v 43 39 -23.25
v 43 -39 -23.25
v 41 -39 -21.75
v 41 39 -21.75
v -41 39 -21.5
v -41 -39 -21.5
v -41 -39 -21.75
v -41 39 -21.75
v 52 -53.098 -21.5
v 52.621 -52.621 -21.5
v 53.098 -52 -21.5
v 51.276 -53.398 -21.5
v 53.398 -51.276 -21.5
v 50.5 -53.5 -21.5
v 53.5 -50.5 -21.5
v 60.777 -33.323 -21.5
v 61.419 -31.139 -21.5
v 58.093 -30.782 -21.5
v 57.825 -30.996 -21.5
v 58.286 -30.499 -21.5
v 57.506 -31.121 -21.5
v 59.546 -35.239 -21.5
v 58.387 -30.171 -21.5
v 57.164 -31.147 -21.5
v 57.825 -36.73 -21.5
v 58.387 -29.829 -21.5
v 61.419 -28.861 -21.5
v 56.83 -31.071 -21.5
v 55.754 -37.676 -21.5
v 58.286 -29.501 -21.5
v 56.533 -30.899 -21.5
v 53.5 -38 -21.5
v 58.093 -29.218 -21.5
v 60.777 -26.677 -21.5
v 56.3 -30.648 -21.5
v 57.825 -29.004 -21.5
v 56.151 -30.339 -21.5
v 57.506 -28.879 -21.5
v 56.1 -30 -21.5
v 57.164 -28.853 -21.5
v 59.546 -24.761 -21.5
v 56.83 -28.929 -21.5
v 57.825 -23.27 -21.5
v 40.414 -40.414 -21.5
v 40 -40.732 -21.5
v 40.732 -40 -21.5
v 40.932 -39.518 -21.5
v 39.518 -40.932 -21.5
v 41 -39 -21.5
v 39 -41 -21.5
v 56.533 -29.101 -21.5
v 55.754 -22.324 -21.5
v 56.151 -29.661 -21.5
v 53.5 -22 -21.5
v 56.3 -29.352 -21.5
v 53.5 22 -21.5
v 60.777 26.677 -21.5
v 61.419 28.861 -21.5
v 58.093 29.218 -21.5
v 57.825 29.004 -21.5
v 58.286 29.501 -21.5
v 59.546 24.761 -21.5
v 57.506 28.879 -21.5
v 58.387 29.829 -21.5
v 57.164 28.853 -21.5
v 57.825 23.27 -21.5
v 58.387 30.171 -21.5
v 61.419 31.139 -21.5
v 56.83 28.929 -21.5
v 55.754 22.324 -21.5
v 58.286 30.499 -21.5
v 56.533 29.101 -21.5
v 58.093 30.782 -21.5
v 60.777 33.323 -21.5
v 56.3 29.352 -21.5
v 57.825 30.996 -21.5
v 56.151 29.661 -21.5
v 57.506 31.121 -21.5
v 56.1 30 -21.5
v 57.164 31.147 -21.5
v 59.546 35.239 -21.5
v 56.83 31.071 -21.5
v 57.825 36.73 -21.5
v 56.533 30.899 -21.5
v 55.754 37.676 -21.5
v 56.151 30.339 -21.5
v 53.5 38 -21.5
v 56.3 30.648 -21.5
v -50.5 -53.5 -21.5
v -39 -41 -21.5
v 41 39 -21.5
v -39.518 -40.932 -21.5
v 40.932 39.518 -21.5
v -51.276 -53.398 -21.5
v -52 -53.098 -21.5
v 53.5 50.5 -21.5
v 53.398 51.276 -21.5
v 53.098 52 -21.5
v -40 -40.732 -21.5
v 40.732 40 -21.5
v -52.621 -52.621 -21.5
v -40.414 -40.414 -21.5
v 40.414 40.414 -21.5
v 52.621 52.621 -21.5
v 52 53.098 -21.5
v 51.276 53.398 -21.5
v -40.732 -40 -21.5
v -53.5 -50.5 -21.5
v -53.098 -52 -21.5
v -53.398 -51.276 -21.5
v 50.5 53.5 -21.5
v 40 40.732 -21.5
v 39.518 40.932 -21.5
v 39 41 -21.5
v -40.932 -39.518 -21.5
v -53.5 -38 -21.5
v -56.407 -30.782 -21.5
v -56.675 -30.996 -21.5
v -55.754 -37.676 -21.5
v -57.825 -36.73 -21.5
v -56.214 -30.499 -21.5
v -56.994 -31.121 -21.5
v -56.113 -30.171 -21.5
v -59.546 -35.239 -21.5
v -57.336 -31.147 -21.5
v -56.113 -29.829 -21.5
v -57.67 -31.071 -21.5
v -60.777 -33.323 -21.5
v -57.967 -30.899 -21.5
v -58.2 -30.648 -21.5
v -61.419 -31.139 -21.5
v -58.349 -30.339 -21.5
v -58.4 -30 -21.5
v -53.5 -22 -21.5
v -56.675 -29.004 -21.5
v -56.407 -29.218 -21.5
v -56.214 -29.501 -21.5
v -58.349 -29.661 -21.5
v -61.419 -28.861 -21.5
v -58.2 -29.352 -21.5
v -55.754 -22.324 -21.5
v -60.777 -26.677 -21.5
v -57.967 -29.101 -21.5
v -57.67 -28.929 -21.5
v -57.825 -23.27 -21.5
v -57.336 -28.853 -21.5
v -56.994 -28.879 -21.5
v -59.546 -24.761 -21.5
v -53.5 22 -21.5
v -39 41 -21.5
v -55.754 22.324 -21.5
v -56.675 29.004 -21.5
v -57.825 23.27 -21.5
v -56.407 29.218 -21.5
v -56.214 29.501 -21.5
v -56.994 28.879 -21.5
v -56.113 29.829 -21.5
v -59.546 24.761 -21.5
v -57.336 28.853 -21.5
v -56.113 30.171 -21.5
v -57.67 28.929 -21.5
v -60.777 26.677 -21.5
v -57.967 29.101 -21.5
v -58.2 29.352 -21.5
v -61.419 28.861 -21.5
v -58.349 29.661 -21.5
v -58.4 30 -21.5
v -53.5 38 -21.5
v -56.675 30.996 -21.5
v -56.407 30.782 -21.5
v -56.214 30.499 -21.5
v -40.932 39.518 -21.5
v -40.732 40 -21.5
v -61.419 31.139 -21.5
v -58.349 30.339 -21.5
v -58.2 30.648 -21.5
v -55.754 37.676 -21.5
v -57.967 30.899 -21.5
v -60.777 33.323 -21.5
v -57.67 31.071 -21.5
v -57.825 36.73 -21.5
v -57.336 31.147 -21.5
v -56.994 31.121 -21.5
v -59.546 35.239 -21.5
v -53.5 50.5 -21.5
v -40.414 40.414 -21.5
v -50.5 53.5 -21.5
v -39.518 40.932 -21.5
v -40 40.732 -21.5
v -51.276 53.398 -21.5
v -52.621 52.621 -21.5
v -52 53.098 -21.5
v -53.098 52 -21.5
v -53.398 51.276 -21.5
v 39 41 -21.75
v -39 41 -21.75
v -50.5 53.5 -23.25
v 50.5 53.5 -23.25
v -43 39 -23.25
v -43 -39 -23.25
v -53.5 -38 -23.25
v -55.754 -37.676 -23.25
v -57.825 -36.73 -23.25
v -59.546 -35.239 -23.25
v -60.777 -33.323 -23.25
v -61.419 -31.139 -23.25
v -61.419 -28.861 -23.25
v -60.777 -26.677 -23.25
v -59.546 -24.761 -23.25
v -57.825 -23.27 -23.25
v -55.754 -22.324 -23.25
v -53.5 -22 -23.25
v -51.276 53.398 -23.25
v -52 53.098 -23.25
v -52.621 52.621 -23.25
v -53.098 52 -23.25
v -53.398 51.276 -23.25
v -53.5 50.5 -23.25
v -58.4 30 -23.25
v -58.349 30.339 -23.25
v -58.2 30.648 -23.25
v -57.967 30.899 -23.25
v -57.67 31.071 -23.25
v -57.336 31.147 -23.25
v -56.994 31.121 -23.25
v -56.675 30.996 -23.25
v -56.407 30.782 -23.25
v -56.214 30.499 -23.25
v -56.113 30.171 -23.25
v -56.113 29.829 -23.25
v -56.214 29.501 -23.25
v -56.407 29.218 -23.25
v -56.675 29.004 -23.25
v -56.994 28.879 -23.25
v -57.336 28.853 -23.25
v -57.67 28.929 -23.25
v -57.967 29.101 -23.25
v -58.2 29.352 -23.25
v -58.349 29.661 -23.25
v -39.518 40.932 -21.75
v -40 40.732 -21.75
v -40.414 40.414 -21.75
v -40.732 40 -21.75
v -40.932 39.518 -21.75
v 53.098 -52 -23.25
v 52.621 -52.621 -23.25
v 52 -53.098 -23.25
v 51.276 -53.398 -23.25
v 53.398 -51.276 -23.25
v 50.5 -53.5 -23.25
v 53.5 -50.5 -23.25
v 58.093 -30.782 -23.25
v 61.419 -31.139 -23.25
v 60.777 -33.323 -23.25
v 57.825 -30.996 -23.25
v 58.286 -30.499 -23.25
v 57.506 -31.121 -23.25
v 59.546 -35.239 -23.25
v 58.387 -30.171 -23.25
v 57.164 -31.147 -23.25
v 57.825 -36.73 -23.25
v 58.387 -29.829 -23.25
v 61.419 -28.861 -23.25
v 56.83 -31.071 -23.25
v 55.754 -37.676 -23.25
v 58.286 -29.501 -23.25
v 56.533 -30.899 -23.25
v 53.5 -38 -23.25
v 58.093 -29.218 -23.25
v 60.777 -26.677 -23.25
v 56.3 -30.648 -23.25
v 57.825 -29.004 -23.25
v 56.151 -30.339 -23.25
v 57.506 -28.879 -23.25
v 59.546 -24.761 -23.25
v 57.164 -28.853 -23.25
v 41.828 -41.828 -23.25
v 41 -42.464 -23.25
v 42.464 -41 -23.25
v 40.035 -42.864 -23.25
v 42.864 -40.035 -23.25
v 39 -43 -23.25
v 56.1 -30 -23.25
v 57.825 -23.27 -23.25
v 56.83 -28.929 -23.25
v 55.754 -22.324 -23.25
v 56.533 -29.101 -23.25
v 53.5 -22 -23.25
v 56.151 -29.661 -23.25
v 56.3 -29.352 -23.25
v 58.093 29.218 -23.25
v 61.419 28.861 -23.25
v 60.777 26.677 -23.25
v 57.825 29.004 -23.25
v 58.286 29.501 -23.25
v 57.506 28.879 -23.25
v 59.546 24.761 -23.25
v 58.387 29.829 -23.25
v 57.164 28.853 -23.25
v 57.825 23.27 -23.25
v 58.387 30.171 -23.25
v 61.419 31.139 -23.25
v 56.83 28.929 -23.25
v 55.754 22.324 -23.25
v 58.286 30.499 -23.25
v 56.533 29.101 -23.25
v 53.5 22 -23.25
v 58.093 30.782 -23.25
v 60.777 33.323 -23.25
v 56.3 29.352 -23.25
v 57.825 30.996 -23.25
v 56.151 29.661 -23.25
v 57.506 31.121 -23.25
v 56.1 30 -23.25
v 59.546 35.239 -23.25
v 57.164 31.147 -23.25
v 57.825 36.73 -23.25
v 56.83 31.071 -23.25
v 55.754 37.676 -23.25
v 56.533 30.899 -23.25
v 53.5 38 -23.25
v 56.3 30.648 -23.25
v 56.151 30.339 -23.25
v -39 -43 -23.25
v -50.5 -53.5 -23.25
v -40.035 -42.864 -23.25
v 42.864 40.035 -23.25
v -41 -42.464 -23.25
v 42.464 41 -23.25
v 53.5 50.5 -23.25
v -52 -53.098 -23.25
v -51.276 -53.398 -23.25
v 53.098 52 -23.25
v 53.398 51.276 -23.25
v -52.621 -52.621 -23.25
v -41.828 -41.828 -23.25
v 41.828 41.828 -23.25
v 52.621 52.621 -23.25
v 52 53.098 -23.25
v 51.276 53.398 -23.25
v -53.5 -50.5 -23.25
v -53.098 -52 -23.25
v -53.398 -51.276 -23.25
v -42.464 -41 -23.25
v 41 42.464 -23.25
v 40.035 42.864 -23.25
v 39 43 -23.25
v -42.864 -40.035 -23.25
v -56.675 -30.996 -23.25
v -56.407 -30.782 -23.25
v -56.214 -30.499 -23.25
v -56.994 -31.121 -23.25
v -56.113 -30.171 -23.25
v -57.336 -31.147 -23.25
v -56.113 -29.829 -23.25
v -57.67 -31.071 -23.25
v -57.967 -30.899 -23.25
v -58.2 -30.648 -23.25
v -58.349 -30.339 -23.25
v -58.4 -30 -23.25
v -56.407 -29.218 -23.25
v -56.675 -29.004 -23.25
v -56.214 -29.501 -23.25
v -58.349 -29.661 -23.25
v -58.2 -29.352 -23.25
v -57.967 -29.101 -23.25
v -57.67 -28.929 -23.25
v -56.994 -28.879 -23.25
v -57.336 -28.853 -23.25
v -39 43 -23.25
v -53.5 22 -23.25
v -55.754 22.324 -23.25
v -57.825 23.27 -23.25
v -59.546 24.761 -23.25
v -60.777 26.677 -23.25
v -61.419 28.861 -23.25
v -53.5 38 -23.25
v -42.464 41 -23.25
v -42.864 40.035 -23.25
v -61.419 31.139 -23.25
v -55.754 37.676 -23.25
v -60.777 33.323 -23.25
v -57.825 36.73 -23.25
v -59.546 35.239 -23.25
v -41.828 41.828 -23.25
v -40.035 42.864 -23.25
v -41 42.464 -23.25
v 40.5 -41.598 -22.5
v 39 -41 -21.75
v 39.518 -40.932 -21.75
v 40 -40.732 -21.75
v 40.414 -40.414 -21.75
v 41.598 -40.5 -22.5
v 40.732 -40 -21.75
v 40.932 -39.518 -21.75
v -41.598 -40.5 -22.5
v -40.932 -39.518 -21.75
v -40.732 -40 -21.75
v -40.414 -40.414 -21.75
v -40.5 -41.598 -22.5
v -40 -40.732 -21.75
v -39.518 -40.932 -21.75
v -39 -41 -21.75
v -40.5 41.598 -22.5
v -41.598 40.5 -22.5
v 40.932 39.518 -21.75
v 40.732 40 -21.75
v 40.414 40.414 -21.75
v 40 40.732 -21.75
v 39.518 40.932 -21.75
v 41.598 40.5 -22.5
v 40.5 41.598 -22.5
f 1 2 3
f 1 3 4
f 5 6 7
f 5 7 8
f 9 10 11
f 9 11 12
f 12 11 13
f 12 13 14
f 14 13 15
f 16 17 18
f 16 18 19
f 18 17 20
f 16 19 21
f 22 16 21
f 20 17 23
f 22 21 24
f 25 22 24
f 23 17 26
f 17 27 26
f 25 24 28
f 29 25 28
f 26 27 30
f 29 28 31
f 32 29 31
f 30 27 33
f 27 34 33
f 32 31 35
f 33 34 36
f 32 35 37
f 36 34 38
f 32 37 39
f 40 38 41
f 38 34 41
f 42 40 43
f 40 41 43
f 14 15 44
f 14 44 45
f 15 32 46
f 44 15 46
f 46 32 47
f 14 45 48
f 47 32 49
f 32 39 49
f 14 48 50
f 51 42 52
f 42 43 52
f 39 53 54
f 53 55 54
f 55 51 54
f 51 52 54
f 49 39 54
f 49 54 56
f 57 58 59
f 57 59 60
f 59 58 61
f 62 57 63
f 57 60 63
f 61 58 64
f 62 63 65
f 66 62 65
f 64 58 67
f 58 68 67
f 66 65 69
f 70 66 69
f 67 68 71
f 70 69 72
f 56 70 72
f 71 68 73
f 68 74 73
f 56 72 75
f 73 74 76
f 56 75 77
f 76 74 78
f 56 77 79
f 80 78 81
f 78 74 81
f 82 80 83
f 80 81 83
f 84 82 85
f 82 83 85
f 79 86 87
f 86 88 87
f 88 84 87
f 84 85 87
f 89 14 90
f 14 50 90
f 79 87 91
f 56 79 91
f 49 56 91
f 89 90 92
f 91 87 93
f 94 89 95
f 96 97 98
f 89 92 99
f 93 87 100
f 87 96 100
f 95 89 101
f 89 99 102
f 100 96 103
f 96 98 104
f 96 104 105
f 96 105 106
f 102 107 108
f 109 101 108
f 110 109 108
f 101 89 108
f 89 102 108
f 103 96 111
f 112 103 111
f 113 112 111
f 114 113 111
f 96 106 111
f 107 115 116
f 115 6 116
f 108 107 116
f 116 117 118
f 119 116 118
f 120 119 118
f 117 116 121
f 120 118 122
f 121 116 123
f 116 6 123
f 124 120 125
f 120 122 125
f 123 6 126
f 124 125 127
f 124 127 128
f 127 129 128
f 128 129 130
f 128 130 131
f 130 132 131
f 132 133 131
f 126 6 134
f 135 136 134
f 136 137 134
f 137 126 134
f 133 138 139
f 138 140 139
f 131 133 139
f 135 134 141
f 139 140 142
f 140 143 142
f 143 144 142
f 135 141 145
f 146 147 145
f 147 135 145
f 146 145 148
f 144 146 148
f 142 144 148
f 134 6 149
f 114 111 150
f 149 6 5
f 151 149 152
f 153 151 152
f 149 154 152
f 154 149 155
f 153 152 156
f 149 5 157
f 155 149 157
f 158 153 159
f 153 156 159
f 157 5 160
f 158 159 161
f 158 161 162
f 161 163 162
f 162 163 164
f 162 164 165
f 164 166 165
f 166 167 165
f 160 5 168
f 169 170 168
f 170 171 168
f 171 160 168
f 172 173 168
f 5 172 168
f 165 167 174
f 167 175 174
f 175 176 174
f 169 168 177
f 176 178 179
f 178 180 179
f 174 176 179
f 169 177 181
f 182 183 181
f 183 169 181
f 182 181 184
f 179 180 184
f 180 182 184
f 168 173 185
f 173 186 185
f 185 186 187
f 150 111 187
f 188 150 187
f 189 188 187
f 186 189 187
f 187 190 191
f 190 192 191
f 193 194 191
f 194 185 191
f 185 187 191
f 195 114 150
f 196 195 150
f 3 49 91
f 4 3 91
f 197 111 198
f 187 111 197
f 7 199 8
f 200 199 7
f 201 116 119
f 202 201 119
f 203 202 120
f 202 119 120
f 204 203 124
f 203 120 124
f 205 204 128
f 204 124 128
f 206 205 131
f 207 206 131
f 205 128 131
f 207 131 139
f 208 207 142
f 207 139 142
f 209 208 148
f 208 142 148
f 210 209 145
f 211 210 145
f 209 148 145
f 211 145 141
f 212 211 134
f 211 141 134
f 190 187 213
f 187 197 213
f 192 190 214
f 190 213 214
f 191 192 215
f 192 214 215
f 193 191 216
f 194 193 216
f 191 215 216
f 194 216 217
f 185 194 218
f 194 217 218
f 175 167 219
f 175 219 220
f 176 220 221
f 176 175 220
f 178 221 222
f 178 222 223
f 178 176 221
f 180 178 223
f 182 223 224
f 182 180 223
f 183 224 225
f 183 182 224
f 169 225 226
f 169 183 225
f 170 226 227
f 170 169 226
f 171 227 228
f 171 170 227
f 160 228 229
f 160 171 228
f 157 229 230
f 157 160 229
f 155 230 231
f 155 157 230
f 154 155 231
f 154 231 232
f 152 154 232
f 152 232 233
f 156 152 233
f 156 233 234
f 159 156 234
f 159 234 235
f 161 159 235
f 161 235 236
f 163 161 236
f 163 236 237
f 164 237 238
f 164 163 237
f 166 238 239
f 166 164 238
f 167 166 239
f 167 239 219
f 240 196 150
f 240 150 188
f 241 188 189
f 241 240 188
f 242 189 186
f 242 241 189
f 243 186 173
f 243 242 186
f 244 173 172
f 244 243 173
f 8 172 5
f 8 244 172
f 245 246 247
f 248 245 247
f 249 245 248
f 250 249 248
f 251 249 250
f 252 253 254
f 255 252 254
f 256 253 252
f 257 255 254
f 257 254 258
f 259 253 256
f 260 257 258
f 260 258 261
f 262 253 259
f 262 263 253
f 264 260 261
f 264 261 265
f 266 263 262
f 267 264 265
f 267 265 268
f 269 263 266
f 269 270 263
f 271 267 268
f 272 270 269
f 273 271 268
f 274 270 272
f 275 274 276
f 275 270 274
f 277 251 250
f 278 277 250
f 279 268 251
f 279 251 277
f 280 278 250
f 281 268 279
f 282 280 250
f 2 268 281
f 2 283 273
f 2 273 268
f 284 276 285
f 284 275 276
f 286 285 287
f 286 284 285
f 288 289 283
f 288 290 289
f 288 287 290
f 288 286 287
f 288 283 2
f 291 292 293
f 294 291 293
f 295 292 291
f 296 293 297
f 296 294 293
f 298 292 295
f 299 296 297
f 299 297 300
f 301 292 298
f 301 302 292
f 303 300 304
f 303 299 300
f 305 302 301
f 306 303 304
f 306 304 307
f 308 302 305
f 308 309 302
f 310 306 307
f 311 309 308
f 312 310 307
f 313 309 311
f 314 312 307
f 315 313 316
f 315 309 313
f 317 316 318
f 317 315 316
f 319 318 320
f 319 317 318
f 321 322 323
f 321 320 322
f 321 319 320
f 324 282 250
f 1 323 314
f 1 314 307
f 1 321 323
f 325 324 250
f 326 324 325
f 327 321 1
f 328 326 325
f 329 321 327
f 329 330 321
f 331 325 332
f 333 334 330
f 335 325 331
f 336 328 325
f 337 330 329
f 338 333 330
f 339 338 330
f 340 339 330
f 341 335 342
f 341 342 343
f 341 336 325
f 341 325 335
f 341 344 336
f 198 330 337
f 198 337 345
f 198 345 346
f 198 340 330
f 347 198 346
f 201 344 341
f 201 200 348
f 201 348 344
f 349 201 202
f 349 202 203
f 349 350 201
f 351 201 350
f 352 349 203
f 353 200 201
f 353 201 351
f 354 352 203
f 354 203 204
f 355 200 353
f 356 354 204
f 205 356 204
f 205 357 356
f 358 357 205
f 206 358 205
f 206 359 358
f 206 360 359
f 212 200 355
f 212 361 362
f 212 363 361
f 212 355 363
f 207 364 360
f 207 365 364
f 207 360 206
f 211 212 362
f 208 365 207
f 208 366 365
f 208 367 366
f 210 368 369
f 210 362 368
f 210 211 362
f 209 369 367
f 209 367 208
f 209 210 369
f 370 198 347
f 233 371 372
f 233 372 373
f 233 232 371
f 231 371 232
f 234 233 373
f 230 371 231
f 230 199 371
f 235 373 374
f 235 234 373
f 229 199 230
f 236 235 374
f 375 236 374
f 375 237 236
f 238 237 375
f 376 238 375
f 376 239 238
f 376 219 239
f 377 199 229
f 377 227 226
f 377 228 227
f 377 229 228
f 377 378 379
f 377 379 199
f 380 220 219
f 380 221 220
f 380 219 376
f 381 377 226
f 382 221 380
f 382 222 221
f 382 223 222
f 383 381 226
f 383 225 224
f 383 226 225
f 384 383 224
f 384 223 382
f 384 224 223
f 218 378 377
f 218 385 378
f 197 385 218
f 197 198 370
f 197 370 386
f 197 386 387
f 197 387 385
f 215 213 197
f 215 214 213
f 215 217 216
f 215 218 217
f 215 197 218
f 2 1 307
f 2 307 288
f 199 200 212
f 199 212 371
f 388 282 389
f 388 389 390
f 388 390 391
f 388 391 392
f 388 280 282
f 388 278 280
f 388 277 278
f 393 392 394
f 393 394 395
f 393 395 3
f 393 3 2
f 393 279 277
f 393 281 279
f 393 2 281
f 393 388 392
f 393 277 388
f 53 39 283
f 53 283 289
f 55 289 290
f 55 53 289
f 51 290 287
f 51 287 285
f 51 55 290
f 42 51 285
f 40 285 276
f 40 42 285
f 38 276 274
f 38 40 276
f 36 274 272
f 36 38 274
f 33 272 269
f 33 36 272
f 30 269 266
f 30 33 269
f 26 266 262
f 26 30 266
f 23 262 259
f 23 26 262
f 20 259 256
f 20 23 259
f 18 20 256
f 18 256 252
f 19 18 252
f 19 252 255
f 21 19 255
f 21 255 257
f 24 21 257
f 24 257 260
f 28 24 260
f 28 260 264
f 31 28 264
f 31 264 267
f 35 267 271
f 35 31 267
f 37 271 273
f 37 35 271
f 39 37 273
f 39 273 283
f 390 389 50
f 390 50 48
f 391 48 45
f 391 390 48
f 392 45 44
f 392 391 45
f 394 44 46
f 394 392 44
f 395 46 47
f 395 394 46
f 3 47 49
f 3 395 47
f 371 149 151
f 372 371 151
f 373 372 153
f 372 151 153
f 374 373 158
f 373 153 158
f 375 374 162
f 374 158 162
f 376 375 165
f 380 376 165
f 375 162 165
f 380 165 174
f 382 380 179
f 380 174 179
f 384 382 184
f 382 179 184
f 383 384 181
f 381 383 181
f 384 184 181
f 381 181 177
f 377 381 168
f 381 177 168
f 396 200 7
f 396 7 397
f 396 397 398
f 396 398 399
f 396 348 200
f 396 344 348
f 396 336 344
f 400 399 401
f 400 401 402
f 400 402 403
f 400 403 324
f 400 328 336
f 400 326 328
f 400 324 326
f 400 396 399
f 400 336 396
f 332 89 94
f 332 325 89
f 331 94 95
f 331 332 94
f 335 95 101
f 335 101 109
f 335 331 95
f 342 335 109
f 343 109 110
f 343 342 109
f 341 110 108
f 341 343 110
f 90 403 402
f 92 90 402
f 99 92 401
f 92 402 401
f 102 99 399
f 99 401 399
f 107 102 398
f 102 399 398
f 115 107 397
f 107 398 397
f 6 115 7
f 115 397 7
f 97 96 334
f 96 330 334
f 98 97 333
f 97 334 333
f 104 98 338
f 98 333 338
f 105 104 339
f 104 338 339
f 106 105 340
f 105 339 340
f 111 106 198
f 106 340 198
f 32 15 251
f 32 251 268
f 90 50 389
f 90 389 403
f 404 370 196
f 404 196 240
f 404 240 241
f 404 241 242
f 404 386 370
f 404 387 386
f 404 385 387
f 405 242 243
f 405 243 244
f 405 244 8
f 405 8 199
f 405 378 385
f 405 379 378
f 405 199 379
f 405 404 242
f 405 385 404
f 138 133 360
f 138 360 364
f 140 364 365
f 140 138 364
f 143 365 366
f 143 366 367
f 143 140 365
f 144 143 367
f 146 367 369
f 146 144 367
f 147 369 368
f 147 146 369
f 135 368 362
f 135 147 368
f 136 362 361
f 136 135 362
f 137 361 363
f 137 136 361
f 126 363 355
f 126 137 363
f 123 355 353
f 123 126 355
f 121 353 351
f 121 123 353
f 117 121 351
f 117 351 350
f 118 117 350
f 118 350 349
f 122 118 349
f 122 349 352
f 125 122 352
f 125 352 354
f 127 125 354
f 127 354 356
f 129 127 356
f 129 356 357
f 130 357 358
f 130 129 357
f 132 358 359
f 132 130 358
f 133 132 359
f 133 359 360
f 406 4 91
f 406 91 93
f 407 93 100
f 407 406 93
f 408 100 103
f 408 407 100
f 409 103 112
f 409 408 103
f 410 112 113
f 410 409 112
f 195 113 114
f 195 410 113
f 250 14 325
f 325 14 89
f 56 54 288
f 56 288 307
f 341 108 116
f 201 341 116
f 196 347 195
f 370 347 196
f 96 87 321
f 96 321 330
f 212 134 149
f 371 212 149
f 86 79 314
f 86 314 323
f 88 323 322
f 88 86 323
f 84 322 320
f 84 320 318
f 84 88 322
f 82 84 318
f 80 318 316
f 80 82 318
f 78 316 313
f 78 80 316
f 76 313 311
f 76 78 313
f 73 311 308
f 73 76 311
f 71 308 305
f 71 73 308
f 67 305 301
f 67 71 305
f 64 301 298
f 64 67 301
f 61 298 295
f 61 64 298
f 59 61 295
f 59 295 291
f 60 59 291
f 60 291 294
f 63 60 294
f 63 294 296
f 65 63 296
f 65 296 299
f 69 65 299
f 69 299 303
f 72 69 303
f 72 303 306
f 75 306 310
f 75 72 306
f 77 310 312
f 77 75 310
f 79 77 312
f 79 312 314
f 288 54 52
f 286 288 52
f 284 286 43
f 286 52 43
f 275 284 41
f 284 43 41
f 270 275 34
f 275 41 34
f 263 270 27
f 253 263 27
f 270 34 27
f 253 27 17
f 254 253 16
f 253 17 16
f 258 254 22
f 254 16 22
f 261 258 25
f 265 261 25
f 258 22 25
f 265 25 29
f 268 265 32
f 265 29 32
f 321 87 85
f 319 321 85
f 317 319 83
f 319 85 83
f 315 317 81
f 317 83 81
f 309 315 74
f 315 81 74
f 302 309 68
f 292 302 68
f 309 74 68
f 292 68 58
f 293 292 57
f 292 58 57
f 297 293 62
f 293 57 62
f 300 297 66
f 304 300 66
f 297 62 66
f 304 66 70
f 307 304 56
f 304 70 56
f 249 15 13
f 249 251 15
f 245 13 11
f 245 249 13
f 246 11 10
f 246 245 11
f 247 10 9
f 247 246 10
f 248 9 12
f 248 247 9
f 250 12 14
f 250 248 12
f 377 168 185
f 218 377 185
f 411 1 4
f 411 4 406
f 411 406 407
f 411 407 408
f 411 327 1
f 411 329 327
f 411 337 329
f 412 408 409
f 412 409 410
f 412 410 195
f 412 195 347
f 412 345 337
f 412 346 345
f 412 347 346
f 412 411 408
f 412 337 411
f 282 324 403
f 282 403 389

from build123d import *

# Parameters (mm, degrees)
SKETCH025_W             = 107
SKETCH025_H             = 107
SKETCH025_W_2           = 82
SKETCH025_H_2           = 82
PAD005_DEPTH            = 1.75
SKETCH026_R             = 1.15
PAD006_DEPTH            = 1.75
FILLET008_R             = 3
FILLET009_R             = 2
CHAMFER014_SIZE2        = 2
CHAMFER014_SIZE         = 1.5
BODY005_PLACEMENT_ANGLE = 180


with BuildPart() as part:
    # Sketch025 → Pad005 (new body)
    with BuildSketch(Plane.XY):
        Rectangle(SKETCH025_W, SKETCH025_H)
        Rectangle(SKETCH025_W_2, SKETCH025_H_2, mode=Mode.SUBTRACT)
    extrude(amount=PAD005_DEPTH)

    # Sketch026 → Pad006 (join)
    with BuildSketch(Plane.XY):
        with BuildLine():
            ThreePointArc((-53.5, 38), (-61.5, 30), (-53.5, 22))
            Line((-53.5, 38), (-53.5, 22))
        make_face()
        with Locations((-57.25, 30)):
            Circle(SKETCH026_R, mode=Mode.SUBTRACT)
        with BuildLine():
            ThreePointArc((-53.5, -22), (-61.5, -30), (-53.5, -38))
            Line((-53.5, -22), (-53.5, -38))
        make_face()
        with Locations((-57.25, -30)):
            Circle(SKETCH026_R, mode=Mode.SUBTRACT)
        with BuildLine():
            Line((53.5, 38), (53.5, 22))
            ThreePointArc((53.5, 22), (61.5, 30), (53.5, 38))
        make_face()
        with Locations((57.25, 30)):
            Circle(SKETCH026_R, mode=Mode.SUBTRACT)
        with BuildLine():
            ThreePointArc((53.5, -38), (61.5, -30), (53.5, -22))
            Line((53.5, -22), (53.5, -38))
        make_face()
        with Locations((57.25, -30)):
            Circle(SKETCH026_R, mode=Mode.SUBTRACT)
    extrude(amount=PAD006_DEPTH)

    # Fillet008
    fillet008_edges = [part.edges().sort_by_distance(p)[0] for p in [
        (-53.5, 53.5, 0.875),
        (53.5, 53.5, 0.875),
        (53.5, -53.5, 0.875),
        (-53.5, -53.5, 0.875),
    ]]
    fillet(fillet008_edges, radius=FILLET008_R)

    # Fillet009
    fillet009_edges = [part.edges().sort_by_distance(p)[0] for p in [
        (-41, 41, 0.875),
        (41, 41, 0.875),
        (41, -41, 0.875),
        (-41, -41, 0.875),
    ]]
    fillet(fillet009_edges, radius=FILLET009_R)

    # Chamfer014
    chamfer014_edges = [part.edges().sort_by_distance(p)[0] for p in [
        (-41, 0, 1.75),
    ]]
    chamfer014_side = part.faces().sort_by_distance((-41, 0, 0.875))[0]
    chamfer(chamfer014_edges, length=CHAMFER014_SIZE, length2=CHAMFER014_SIZE2, reference=chamfer014_side)


with BuildPart() as part_1:
    # Body004 placement: moved
    add(part.part.moved(Location((0, 0, 21.5))))


with BuildPart() as part_2:
    # Body005 placement: moved
    add(part_1.part.rotate(Axis((0, 0, 0), (0, 1, 0)), BODY005_PLACEMENT_ANGLE))


solid = part_2.part
